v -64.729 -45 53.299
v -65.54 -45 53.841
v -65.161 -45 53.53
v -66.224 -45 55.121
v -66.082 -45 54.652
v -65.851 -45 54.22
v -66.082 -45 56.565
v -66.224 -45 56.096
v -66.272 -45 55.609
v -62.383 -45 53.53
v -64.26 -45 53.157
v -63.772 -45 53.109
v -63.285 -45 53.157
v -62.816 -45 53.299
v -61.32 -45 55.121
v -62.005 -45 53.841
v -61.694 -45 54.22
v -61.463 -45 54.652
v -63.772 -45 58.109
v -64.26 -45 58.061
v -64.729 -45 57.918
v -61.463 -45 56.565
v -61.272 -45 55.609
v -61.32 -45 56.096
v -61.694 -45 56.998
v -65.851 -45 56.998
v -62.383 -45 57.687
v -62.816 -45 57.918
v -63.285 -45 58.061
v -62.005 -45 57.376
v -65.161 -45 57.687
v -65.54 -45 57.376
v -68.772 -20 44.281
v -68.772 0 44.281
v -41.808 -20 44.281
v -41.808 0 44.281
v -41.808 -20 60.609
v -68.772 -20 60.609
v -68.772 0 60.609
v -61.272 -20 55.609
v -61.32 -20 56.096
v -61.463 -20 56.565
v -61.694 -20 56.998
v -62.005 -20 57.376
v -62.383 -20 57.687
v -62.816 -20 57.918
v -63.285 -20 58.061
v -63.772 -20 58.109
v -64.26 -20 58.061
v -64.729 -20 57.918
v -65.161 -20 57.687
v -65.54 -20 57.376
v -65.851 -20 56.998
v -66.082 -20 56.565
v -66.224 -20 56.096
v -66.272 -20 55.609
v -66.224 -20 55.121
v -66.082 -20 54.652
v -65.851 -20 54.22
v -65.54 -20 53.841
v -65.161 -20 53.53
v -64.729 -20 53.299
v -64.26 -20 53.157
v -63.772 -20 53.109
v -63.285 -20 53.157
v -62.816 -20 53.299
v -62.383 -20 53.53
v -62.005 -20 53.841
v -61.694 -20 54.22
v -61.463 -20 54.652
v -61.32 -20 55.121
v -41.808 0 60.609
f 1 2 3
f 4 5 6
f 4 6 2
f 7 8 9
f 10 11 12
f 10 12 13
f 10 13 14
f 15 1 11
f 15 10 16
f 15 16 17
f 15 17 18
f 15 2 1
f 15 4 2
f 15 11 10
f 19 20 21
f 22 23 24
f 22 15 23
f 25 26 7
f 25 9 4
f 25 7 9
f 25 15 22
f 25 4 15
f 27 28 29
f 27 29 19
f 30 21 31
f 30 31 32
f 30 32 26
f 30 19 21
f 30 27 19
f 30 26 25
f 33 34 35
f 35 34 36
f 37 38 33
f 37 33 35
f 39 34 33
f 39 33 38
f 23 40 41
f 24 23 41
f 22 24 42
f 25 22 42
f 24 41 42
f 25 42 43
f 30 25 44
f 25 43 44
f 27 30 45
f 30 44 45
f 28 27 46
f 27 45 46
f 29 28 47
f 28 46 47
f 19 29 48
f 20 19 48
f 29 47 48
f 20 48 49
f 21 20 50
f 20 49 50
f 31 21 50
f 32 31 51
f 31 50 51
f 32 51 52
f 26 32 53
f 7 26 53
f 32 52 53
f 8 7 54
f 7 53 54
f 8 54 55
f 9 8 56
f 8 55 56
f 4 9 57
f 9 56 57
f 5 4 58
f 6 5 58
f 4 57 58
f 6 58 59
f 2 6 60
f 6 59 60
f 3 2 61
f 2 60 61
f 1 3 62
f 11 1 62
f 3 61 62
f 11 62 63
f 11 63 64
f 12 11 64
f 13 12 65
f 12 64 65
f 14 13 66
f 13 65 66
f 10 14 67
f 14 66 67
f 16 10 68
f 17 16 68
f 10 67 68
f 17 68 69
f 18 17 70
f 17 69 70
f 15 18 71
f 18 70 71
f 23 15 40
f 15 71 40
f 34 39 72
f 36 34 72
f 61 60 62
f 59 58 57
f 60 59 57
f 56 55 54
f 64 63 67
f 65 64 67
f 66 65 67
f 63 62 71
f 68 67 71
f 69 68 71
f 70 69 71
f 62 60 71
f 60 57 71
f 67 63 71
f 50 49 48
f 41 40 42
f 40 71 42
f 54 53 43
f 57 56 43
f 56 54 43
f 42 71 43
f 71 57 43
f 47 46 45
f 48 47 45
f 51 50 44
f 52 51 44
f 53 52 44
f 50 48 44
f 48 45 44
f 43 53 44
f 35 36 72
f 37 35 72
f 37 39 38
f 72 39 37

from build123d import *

# Parameters (mm, degrees)
F0_W     = 26.9646756351
F0_H     = 16.3272283971
F1_DEPTH = 20
F2_R     = 2.5
F3_DEPTH = 25


# Not quite as in the source:
# - the program builds the solid bodies; features that only make, move or delete a surface that nothing else refers to are left out


with BuildPart() as f1:
    # F0 (on Front) → F1 (new body)
    with BuildSketch(Plane.XZ):
        with Locations((-55.2899483591, 52.4450521916)):
            Rectangle(F0_W, F0_H)
    extrude(amount=F1_DEPTH)


with BuildPart() as f3:
    # F2 (on face) → F3 (new body)
    with BuildSketch(Plane.XZ.offset(20)):
        with Locations((-63.7722861767, 55.6086663902)):
            Circle(F2_R)
    extrude(amount=F3_DEPTH)


solid = Compound([f1.part, f3.part])
